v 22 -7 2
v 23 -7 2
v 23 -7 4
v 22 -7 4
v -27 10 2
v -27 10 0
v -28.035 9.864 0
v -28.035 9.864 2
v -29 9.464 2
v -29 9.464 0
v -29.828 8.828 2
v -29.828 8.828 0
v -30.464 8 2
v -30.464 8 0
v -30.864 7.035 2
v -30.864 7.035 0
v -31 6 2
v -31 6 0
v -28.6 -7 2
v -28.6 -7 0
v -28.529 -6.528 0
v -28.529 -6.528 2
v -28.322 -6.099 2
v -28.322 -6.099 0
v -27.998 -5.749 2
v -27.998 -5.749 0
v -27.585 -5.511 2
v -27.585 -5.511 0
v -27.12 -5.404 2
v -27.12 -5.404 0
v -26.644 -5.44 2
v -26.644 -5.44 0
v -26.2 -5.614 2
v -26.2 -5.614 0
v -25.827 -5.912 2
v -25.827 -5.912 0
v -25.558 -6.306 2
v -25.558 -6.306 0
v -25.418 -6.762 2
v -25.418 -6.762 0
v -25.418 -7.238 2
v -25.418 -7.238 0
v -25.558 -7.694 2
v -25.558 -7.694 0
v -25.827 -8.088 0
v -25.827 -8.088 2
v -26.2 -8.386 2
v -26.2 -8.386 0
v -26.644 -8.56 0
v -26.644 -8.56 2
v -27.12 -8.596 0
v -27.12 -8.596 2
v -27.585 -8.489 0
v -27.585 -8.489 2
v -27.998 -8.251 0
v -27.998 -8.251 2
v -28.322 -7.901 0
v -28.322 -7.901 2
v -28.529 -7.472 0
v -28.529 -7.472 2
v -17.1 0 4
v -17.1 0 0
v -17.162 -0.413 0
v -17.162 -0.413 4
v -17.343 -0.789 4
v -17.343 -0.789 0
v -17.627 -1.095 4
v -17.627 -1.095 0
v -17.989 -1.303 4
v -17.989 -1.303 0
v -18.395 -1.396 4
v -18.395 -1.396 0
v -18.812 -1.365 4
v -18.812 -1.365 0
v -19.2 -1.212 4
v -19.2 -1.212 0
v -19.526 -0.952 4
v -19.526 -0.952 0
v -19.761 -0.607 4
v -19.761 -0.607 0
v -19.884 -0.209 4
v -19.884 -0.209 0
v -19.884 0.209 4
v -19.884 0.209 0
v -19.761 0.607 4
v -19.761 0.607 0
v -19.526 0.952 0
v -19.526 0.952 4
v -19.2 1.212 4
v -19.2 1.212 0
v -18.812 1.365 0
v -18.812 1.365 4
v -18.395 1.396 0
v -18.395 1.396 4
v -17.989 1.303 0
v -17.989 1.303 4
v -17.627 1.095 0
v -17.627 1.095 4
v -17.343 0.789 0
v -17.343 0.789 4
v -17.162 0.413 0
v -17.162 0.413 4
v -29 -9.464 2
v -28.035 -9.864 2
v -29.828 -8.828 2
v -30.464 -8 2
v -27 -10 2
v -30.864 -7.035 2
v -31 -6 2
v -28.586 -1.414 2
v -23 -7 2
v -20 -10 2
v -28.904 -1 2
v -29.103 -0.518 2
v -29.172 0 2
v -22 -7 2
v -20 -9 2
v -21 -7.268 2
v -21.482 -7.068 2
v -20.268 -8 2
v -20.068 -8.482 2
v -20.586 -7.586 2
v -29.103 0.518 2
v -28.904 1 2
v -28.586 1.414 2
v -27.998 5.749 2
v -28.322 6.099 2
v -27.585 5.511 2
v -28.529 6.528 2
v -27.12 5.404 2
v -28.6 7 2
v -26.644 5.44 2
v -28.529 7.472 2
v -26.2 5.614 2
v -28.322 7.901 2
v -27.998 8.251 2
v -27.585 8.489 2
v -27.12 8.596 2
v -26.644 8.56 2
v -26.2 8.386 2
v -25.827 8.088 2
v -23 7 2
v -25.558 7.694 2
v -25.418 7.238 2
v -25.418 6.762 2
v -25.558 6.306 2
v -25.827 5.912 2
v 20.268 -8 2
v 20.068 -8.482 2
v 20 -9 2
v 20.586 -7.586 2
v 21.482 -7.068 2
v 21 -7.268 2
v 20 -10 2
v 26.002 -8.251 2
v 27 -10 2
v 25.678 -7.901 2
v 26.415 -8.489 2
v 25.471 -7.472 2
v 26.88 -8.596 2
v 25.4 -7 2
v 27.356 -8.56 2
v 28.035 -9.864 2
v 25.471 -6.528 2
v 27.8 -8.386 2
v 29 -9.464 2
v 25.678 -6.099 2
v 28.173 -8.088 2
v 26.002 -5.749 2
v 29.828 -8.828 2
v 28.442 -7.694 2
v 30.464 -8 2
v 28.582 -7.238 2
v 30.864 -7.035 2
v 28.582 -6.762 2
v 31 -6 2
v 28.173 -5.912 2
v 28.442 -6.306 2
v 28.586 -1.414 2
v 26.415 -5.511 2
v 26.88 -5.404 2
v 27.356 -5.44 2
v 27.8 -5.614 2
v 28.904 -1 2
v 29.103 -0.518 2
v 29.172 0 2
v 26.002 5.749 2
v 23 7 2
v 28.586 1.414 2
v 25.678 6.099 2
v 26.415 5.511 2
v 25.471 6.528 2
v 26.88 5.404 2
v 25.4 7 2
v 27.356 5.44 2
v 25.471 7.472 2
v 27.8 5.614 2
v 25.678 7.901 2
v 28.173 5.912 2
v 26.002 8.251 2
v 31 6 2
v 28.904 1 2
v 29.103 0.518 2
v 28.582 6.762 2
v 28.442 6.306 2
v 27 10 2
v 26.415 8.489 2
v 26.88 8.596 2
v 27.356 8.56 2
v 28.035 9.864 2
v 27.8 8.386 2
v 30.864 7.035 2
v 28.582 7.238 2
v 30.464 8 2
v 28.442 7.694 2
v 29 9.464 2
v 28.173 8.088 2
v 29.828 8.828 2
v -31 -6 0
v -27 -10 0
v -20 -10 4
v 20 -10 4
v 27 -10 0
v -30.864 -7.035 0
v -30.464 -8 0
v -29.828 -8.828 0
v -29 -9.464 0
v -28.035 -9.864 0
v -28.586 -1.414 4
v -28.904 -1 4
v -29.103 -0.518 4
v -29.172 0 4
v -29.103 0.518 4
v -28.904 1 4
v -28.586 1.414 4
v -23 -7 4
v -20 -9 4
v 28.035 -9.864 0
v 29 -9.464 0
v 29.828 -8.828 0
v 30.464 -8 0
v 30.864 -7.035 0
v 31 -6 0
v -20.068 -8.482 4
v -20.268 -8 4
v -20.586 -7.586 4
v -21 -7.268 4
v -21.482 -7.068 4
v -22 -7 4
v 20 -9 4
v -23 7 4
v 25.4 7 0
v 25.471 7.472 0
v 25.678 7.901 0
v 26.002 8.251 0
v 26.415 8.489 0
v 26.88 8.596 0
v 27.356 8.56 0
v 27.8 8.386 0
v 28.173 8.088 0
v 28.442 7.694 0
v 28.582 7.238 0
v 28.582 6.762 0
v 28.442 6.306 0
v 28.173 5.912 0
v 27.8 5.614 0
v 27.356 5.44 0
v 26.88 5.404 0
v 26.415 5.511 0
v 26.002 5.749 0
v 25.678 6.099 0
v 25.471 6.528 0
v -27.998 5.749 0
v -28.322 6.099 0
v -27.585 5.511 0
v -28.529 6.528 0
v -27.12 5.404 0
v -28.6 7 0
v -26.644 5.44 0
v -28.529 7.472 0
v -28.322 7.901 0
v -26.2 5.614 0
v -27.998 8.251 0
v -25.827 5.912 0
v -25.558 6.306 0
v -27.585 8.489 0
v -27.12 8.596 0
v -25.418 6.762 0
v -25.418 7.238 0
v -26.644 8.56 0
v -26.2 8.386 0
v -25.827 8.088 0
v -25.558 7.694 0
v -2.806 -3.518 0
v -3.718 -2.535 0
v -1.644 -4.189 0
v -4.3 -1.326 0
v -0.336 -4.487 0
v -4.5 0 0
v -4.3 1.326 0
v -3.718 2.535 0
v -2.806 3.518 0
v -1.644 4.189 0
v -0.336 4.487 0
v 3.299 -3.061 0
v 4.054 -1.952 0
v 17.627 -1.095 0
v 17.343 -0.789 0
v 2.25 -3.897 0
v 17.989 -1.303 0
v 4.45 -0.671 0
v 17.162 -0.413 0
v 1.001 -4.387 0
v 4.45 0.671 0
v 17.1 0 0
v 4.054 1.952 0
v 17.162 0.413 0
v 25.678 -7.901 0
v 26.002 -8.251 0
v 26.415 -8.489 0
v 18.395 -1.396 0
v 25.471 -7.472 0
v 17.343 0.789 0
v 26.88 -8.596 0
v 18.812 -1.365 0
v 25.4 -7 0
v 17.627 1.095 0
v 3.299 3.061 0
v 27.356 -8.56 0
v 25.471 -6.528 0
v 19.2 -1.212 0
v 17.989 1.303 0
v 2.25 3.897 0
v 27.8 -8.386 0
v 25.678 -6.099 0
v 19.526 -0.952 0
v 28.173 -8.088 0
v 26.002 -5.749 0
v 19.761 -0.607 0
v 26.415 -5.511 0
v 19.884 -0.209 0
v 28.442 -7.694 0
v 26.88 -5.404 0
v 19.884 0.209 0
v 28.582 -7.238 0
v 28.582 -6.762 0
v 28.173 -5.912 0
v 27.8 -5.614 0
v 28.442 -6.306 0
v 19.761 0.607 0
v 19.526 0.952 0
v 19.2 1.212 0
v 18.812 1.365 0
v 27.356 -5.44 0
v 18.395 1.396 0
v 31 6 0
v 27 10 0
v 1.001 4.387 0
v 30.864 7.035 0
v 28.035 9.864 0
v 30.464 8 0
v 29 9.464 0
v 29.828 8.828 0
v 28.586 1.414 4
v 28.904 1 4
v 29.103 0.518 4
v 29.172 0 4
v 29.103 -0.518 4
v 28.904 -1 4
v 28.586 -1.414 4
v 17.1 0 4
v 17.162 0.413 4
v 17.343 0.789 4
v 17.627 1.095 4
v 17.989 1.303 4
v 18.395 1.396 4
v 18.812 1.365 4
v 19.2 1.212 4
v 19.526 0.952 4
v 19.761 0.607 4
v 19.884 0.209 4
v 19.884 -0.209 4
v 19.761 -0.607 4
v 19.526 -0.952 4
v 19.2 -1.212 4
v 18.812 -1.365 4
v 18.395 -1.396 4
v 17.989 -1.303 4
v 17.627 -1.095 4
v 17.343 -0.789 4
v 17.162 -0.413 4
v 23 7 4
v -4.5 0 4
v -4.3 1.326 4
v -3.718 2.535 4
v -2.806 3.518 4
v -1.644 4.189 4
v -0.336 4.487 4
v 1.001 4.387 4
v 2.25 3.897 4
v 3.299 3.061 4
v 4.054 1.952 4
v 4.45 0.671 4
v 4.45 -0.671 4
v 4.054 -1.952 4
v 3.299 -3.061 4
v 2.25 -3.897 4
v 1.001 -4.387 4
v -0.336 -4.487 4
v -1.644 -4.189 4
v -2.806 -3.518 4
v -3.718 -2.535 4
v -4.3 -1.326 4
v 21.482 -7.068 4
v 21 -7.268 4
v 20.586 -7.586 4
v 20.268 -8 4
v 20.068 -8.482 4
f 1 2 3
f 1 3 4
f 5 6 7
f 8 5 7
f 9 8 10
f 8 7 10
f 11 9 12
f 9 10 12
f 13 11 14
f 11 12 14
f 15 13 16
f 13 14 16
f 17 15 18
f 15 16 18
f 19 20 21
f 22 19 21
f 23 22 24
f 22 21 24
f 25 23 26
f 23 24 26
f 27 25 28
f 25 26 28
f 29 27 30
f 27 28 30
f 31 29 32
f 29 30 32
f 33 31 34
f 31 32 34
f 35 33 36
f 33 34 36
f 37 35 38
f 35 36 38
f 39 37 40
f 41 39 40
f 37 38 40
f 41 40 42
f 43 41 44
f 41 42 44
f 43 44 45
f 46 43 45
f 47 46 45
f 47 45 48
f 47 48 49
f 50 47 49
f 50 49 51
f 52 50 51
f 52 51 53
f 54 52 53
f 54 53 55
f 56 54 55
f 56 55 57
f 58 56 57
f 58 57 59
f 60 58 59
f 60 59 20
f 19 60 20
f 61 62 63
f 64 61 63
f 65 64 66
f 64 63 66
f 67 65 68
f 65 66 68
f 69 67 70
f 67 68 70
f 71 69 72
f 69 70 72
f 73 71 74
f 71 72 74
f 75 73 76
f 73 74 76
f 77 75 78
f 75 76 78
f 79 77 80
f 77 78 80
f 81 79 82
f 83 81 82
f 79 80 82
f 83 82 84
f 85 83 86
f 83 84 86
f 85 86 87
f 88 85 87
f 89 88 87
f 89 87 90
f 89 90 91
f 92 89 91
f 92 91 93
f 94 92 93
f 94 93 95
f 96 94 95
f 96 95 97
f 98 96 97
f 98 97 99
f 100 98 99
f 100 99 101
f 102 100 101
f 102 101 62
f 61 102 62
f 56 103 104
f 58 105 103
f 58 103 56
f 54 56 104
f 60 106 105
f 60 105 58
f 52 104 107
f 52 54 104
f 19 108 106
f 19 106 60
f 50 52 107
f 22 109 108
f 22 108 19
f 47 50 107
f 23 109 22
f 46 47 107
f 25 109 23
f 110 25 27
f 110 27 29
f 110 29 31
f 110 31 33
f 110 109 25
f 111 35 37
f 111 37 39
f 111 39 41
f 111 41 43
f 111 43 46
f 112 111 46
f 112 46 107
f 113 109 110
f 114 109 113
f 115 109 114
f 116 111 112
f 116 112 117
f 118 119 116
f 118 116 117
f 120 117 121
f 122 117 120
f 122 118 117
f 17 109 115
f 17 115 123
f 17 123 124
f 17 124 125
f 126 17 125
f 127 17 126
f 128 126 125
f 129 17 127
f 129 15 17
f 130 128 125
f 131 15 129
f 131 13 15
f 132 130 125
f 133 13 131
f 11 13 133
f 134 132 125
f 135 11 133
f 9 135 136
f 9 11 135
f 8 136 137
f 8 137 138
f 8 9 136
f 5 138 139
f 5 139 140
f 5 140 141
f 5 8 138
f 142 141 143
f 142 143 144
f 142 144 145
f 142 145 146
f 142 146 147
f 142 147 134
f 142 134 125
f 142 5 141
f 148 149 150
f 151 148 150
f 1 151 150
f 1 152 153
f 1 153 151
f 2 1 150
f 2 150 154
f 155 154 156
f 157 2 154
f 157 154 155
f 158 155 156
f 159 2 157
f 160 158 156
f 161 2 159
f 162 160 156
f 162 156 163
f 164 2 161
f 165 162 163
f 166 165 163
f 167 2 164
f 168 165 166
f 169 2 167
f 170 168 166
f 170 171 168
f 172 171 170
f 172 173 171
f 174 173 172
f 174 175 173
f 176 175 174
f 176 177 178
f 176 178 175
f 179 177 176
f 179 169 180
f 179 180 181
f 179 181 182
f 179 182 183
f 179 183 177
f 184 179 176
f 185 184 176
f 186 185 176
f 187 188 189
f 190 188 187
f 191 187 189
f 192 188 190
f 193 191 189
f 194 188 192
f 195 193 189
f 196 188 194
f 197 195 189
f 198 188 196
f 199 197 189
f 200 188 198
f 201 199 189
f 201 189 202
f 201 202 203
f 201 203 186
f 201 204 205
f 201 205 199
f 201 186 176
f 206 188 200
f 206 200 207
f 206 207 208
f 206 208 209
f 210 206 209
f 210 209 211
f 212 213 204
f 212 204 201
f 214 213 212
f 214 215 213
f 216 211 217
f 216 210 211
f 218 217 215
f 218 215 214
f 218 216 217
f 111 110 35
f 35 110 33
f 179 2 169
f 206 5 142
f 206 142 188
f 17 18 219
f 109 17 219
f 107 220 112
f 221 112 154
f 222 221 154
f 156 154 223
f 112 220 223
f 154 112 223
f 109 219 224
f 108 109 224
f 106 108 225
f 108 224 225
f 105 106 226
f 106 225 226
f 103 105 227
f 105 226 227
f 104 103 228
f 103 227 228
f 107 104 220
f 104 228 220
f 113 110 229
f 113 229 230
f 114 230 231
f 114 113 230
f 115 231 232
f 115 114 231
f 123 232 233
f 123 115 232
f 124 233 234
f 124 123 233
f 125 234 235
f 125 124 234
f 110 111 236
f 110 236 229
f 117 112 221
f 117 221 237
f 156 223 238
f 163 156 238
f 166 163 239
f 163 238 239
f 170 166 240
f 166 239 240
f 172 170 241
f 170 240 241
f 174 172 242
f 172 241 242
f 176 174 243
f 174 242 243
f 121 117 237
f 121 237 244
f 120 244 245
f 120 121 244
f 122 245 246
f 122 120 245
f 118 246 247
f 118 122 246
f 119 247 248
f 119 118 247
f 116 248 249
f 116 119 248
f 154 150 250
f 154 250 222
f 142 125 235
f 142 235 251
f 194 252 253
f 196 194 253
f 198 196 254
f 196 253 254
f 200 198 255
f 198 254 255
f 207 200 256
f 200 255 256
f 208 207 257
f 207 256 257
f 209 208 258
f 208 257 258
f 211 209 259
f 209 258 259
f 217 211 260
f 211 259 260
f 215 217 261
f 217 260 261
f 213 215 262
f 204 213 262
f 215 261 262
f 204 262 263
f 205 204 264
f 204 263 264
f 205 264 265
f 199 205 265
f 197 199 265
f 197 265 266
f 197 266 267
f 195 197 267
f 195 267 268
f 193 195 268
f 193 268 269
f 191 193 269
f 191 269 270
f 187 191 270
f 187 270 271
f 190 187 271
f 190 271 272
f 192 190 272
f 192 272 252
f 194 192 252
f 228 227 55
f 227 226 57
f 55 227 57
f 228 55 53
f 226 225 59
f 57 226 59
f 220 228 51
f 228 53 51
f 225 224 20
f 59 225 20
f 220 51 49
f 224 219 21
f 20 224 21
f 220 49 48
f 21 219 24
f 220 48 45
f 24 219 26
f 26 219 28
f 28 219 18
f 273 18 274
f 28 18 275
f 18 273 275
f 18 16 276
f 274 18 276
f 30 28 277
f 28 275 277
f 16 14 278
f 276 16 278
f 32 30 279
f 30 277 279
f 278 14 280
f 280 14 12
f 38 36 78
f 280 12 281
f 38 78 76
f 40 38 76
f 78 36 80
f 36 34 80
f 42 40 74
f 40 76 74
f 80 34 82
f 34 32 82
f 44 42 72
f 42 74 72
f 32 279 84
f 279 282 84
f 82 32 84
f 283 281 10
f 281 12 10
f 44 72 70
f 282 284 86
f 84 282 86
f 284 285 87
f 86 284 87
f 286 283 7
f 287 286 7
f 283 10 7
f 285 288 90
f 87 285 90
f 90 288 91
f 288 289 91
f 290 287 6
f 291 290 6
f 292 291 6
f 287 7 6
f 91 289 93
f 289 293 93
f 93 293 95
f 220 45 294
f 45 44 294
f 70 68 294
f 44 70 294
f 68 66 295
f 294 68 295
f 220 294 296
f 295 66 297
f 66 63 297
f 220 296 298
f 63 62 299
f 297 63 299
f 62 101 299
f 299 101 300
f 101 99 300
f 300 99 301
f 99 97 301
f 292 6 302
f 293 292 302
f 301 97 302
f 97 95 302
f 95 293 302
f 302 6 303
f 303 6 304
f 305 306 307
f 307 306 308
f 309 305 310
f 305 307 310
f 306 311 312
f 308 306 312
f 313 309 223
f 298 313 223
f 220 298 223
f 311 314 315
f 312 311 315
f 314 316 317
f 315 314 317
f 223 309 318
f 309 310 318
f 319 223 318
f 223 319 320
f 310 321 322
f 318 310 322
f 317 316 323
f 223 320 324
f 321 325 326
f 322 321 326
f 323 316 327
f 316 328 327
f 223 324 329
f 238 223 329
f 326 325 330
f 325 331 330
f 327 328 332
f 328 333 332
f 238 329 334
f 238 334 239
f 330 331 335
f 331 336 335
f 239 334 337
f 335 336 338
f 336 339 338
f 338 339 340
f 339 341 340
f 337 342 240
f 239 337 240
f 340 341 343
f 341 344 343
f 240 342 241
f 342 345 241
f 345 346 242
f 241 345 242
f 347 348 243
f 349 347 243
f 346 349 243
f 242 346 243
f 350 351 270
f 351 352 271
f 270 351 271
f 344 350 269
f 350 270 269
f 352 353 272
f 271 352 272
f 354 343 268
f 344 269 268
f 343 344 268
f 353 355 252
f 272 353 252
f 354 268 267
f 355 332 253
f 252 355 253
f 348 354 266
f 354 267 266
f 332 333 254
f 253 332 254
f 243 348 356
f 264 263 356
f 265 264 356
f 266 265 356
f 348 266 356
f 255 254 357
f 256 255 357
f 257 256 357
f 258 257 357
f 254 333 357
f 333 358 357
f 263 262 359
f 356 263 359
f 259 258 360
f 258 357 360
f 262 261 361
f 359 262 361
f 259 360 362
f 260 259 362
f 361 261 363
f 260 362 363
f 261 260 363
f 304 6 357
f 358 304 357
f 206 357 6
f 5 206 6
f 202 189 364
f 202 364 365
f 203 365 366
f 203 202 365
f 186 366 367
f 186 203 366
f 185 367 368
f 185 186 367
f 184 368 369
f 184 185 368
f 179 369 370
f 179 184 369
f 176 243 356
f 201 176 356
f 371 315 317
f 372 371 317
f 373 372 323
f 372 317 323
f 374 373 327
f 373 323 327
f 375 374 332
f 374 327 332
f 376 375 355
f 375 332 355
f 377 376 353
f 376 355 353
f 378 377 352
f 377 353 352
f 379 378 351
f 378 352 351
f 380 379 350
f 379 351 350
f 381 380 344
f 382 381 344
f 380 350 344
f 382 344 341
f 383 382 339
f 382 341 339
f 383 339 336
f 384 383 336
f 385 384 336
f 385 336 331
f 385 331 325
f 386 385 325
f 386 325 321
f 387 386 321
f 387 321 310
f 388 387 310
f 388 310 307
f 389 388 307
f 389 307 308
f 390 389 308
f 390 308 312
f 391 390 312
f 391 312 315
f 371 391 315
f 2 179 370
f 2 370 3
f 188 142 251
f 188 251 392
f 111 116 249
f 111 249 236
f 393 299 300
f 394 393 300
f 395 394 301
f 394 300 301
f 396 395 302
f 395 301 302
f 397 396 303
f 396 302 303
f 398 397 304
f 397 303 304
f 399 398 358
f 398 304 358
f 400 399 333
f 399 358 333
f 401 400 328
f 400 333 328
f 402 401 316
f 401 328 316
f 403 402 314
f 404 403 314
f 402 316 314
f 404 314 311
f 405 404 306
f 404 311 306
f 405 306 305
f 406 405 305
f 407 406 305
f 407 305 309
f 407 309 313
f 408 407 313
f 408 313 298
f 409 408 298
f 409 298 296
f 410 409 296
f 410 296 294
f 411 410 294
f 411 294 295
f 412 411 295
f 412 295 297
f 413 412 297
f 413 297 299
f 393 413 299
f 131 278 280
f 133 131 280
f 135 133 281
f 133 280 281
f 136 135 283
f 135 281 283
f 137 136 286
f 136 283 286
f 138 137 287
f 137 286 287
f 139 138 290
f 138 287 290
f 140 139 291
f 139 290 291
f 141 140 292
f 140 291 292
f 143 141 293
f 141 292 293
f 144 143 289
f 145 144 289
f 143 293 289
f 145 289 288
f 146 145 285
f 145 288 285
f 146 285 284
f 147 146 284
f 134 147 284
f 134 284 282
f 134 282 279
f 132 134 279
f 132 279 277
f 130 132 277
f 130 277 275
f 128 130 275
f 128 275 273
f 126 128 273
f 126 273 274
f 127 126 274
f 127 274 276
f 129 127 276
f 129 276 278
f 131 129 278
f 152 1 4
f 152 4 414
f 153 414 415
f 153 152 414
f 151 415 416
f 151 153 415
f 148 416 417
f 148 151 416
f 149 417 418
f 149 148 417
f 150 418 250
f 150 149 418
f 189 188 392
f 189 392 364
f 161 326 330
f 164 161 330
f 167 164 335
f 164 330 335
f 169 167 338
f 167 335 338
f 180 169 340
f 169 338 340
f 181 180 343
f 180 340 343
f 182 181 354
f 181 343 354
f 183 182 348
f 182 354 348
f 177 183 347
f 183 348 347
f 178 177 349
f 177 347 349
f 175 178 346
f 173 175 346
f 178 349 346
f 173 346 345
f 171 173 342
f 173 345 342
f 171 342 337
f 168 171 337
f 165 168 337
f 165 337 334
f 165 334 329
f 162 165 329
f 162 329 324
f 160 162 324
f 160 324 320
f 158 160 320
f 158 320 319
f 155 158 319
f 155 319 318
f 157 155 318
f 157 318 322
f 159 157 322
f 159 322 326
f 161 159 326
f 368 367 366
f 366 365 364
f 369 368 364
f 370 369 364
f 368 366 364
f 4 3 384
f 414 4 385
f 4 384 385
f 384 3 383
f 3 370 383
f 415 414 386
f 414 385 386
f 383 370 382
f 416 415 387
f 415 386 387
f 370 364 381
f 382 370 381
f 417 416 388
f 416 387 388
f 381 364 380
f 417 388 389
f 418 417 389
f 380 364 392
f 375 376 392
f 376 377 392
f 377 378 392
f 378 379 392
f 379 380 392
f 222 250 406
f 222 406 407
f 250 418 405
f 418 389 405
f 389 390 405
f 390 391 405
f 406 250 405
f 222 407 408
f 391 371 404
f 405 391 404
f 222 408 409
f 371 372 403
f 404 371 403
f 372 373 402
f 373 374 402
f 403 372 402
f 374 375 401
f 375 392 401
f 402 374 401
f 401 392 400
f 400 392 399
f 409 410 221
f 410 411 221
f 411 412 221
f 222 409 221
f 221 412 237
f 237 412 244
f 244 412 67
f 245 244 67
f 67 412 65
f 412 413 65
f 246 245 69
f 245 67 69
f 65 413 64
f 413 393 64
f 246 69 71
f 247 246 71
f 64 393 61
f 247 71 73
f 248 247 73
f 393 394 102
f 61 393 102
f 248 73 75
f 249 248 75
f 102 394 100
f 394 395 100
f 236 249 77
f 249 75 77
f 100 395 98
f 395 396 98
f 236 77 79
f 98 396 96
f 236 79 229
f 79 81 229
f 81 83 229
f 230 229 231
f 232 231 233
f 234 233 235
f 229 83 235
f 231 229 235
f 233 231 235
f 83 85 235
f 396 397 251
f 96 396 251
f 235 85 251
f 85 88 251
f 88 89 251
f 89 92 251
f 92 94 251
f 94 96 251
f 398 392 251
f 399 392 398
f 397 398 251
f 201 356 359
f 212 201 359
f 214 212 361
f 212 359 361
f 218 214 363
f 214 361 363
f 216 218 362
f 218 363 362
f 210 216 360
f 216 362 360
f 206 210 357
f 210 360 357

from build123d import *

# Parameters (mm, degrees)
BOSS_EXTRUDE1_DEPTH = 2
BOSS_EXTRUDE2_DEPTH = 2
CUT_EXTRUDE1_REACH  = 34.818
SKETCH4_R           = 4.5
SKETCH4_R_2         = 1.4
CUT_EXTRUDE2_REACH  = 34.818
SKETCH5_R           = 1.6


with BuildPart() as part:
    # Sketch2 → Boss-Extrude1 (new body)
    with BuildSketch(Plane.XY):
        with BuildLine():
            Line((-27, -10), (27, -10))
            ThreePointArc((27, -10), (29.828427125, -8.828427125), (31, -6))
            Line((31, -6), (31, 6))
            ThreePointArc((31, 6), (29.828427125, 8.828427125), (27, 10))
            Line((27, 10), (-27, 10))
            ThreePointArc((-27, 10), (-29.828427125, 8.828427125), (-31, 6))
            Line((-31, 6), (-31, -6))
            ThreePointArc((-31, -6), (-29.828427125, -8.828427125), (-27, -10))
        make_face()
    extrude(amount=BOSS_EXTRUDE1_DEPTH)

    # Sketch3 → Boss-Extrude2 (add)
    with BuildSketch(Plane.XY.offset(2)):
        with BuildLine():
            Line((-28.585786438, 1.414213562), (-23, 7))
            Line((-23, 7), (23, 7))
            Line((23, 7), (28.585786438, 1.414213562))
            ThreePointArc((28.585786438, 1.414213562), (29.171572875, 0), (28.585786438, -1.414213562))
            Line((28.585786438, -1.414213562), (23, -7))
            Line((23, -7), (22, -7))
            ThreePointArc((22, -7), (20.585786438, -7.585786438), (20, -9))
            Line((20, -9), (20, -10))
            Line((20, -10), (-20, -10))
            Line((-20, -10), (-20, -9))
            ThreePointArc((-20, -9), (-20.585786438, -7.585786438), (-22, -7))
            Line((-22, -7), (-23, -7))
            Line((-23, -7), (-28.585786438, -1.414213562))
            ThreePointArc((-28.585786438, -1.414213562), (-29.171572875, 0), (-28.585786438, 1.414213562))
        make_face()
    extrude(amount=BOSS_EXTRUDE2_DEPTH)

    # Sketch4 → Cut-Extrude1 (cut, up to next)
    with BuildSketch(Plane(origin=(0, 0, 0), x_dir=(-1, 0, 0), z_dir=(0, 0, -1)), mode=Mode.PRIVATE) as cut_extrude1_sk1:
        Circle(SKETCH4_R)
    cut_extrude1_tool1 = extrude(cut_extrude1_sk1.sketch, amount=-CUT_EXTRUDE1_REACH, mode=Mode.PRIVATE) & part.part
    # Sketch4 → Cut-Extrude1 (cut, up to next)
    with BuildSketch(Plane(origin=(0, 0, 0), x_dir=(-1, 0, 0), z_dir=(0, 0, -1)), mode=Mode.PRIVATE) as cut_extrude1_sk2:
        with Locations((-18.5, 0)):
            Circle(SKETCH4_R_2)
    cut_extrude1_tool2 = extrude(cut_extrude1_sk2.sketch, amount=-CUT_EXTRUDE1_REACH, mode=Mode.PRIVATE) & part.part
    # Sketch4 → Cut-Extrude1 (cut, up to next)
    with BuildSketch(Plane(origin=(0, 0, 0), x_dir=(-1, 0, 0), z_dir=(0, 0, -1)), mode=Mode.PRIVATE) as cut_extrude1_sk3:
        with Locations(Location((18.5, 0, 0), (0, 0, 180))):
            Circle(SKETCH4_R_2)
    cut_extrude1_tool3 = extrude(cut_extrude1_sk3.sketch, amount=-CUT_EXTRUDE1_REACH, mode=Mode.PRIVATE) & part.part
    add(cut_extrude1_tool1.solids().sort_by_distance((0, 0, 0))[0], mode=Mode.SUBTRACT)
    add(cut_extrude1_tool2.solids().sort_by_distance((18.5, 0, 0))[0], mode=Mode.SUBTRACT)
    add(cut_extrude1_tool3.solids().sort_by_distance((-18.5, 0, 0))[0], mode=Mode.SUBTRACT)

    # Sketch5 → Cut-Extrude2 (cut, up to next)
    with BuildSketch(Plane(origin=(0, 0, 0), x_dir=(-1, 0, 0), z_dir=(0, 0, -1)), mode=Mode.PRIVATE) as cut_extrude2_sk1:
        with Locations((-27, 7)):
            Circle(SKETCH5_R)
    cut_extrude2_tool1 = extrude(cut_extrude2_sk1.sketch, amount=-CUT_EXTRUDE2_REACH, mode=Mode.PRIVATE) & part.part
    # Sketch5 → Cut-Extrude2 (cut, up to next)
    with BuildSketch(Plane(origin=(0, 0, 0), x_dir=(-1, 0, 0), z_dir=(0, 0, -1)), mode=Mode.PRIVATE) as cut_extrude2_sk2:
        with Locations((27, 7)):
            Circle(SKETCH5_R)
    cut_extrude2_tool2 = extrude(cut_extrude2_sk2.sketch, amount=-CUT_EXTRUDE2_REACH, mode=Mode.PRIVATE) & part.part
    # Sketch5 → Cut-Extrude2 (cut, up to next)
    with BuildSketch(Plane(origin=(0, 0, 0), x_dir=(-1, 0, 0), z_dir=(0, 0, -1)), mode=Mode.PRIVATE) as cut_extrude2_sk3:
        with Locations((27, -7)):
            Circle(SKETCH5_R)
    cut_extrude2_tool3 = extrude(cut_extrude2_sk3.sketch, amount=-CUT_EXTRUDE2_REACH, mode=Mode.PRIVATE) & part.part
    # Sketch5 → Cut-Extrude2 (cut, up to next)
    with BuildSketch(Plane(origin=(0, 0, 0), x_dir=(-1, 0, 0), z_dir=(0, 0, -1)), mode=Mode.PRIVATE) as cut_extrude2_sk4:
        with Locations((-27, -7)):
            Circle(SKETCH5_R)
    cut_extrude2_tool4 = extrude(cut_extrude2_sk4.sketch, amount=-CUT_EXTRUDE2_REACH, mode=Mode.PRIVATE) & part.part
    add(cut_extrude2_tool1.solids().sort_by_distance((27, 7, 0))[0], mode=Mode.SUBTRACT)
    add(cut_extrude2_tool2.solids().sort_by_distance((-27, 7, 0))[0], mode=Mode.SUBTRACT)
    add(cut_extrude2_tool3.solids().sort_by_distance((-27, -7, 0))[0], mode=Mode.SUBTRACT)
    add(cut_extrude2_tool4.solids().sort_by_distance((27, -7, 0))[0], mode=Mode.SUBTRACT)


solid = part.part
